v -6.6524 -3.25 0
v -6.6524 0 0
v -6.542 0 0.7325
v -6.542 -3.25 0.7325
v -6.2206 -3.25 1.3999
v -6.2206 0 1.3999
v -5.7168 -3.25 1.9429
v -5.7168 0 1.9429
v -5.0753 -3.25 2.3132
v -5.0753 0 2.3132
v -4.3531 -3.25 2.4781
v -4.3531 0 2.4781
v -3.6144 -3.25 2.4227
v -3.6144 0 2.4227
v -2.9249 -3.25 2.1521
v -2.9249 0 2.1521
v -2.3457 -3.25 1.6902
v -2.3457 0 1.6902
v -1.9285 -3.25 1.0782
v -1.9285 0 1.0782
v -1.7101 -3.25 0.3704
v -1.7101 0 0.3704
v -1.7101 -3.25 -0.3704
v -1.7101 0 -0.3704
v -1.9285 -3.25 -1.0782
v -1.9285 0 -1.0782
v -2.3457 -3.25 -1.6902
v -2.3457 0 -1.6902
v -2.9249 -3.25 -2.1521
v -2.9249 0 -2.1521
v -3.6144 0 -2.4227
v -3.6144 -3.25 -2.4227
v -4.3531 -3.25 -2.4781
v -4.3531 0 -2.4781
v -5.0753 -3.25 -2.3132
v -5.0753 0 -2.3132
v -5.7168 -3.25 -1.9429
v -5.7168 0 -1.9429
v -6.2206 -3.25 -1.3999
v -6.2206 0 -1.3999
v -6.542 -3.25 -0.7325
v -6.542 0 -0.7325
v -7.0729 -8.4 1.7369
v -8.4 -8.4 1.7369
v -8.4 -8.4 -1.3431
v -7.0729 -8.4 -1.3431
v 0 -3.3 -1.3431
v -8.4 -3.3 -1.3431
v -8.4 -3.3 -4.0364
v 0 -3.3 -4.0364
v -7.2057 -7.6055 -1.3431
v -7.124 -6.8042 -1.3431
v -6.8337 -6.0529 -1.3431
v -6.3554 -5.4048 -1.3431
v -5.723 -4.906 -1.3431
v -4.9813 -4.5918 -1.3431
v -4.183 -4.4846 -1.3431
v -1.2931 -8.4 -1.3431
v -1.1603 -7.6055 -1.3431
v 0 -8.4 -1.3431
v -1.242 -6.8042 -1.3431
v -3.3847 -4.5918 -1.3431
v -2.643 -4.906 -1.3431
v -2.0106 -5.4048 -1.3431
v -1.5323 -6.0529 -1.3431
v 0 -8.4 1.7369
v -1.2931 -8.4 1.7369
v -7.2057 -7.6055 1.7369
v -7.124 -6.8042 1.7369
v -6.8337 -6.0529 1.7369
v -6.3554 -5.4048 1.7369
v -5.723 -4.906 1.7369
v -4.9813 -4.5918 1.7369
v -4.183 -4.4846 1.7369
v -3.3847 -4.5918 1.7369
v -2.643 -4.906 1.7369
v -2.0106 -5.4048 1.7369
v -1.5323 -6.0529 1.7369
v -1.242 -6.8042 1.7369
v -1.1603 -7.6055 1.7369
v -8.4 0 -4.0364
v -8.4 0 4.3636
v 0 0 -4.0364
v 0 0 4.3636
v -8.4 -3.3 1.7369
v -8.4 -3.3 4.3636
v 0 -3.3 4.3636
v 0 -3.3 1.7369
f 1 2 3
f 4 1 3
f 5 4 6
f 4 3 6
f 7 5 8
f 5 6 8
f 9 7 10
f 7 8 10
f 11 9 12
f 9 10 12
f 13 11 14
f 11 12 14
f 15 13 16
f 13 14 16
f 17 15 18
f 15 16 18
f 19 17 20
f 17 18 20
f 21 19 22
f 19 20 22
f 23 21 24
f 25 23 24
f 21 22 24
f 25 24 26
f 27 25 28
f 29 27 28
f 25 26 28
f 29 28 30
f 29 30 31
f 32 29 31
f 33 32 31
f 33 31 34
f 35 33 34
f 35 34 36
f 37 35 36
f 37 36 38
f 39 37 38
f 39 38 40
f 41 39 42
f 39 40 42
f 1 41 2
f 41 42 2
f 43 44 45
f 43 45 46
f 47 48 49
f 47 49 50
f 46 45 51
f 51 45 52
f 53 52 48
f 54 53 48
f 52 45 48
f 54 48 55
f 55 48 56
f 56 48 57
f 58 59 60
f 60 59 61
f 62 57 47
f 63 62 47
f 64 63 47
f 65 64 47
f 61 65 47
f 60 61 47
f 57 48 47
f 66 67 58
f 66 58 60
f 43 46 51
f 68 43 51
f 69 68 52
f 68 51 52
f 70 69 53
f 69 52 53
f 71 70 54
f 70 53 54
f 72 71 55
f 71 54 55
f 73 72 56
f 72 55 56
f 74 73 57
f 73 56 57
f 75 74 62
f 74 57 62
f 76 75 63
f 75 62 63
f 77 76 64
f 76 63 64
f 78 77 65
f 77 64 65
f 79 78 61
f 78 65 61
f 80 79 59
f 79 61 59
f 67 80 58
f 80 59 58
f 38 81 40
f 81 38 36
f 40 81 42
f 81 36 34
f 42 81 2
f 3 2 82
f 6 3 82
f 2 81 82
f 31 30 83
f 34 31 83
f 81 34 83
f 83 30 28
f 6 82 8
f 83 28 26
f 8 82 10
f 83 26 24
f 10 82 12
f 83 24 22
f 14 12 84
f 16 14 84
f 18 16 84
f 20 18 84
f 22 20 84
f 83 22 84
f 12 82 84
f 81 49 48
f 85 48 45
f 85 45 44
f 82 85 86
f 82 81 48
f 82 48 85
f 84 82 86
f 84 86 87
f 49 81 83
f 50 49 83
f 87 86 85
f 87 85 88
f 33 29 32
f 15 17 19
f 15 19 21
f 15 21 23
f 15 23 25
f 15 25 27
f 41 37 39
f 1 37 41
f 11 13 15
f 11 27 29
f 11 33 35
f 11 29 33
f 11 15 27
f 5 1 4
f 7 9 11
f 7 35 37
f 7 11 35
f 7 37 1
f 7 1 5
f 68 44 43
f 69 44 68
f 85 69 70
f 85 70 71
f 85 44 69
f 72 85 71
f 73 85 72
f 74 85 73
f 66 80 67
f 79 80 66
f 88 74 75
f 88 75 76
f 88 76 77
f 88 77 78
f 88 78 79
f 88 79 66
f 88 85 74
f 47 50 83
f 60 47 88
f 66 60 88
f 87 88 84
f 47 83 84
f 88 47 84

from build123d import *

# Parameters (mm, degrees)
F0_W     = 8.4
F0_H     = 8.4
F1_DEPTH = 3.3
F2_W     = 8.4
F2_H     = 3.08
F3_DEPTH = 5.1
F5_DEPTH = 25
F6_R     = 2.485
F7_DEPTH = 3.25


with BuildPart() as f1:
    # F0 (on Front) → F1 (new body)
    with BuildSketch(Plane.XZ):
        with Locations((-4.2, 0.163636)):
            Rectangle(F0_W, F0_H)
    extrude(amount=F1_DEPTH)

    # F2 (on face) → F3 (join)
    with BuildSketch(Plane.XZ.offset(3.3)):
        with Locations((-4.2, 0.196881)):
            Rectangle(F2_W, F2_H)
    extrude(amount=F3_DEPTH)

    # F4 (on face) → F5 (cut)
    with BuildSketch(Plane(origin=(0, 0, -1.343119), x_dir=(1, 0, 0), z_dir=(0, 0, -1))):
        with BuildLine():
            Line((-1.293083, 8.4), (-7.072899, 8.4))
            ThreePointArc((-7.072899, 8.4), (-4.182991, 4.484563), (-1.293083, 8.4))
        make_face()
    extrude(amount=-F5_DEPTH, mode=Mode.SUBTRACT)

    # F6 (on face) → F7 (cut)
    with BuildSketch(Plane(origin=(0, 0, 0), x_dir=(-1, 0, 0), z_dir=(0, 1, 0))):
        with Locations((4.167378, 0)):
            Circle(F6_R)
    extrude(amount=-F7_DEPTH, mode=Mode.SUBTRACT)


solid = f1.part
